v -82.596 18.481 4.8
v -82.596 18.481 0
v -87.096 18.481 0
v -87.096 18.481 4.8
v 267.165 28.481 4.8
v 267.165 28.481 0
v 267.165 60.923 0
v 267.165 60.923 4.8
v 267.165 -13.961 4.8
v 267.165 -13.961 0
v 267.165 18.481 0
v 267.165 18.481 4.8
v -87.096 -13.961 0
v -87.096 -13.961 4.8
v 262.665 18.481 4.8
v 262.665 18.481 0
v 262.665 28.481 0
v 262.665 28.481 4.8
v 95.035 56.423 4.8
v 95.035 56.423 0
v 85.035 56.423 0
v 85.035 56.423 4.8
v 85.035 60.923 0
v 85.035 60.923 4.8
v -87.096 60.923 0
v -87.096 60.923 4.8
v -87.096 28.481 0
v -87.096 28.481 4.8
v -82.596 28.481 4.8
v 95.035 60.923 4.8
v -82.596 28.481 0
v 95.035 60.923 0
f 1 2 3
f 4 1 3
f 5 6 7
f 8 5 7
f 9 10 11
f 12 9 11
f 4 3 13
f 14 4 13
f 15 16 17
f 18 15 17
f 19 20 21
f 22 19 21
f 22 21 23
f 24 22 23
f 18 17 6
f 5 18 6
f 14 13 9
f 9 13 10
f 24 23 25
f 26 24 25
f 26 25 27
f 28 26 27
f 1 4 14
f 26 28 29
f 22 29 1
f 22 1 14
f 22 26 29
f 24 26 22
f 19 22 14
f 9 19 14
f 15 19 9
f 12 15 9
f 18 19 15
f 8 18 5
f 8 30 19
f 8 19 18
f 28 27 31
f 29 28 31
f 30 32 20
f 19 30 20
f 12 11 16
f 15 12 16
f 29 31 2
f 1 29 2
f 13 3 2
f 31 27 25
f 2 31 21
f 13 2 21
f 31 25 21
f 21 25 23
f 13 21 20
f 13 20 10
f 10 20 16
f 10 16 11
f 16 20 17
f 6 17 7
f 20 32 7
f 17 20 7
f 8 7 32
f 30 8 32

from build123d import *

# Parameters (mm, degrees)
F1_DEPTH = 4.8


with BuildPart() as f1:
    # F0 (on Top) → F1 (new body)
    with BuildSketch(Plane.XY):
        Polygon((-82.595532, 18.481104), (-87.095532, 18.481104), (-87.095532, -13.960981), (85.034968, -13.960981), (85.034968, -9.460981), (90.034968, -9.460981), (90.034968, 23.481104), (-82.595532, 23.481104), align=None)
        Polygon((85.034968, 60.923189), (-87.095532, 60.923189), (-87.095532, 28.481104), (-82.595532, 28.481104), (-82.595532, 23.481104), (90.034968, 23.481104), (90.034968, 56.423189), (85.034968, 56.423189), align=None)
        Polygon((262.665468, 23.481104), (90.034968, 23.481104), (90.034968, -9.460981), (95.034968, -9.460981), (95.034968, -13.960981), (267.165468, -13.960981), (267.165468, 18.481104), (262.665468, 18.481104), align=None)
        Polygon((267.165468, 60.923189), (95.034968, 60.923189), (95.034968, 56.423189), (90.034968, 56.423189), (90.034968, 23.481104), (262.665468, 23.481104), (262.665468, 28.481104), (267.165468, 28.481104), align=None)
        Polygon((85.034968, -9.460981), (85.034968, -13.960981), (95.034968, -13.960981), (95.034968, -9.460981), (90.034968, -9.460981), align=None)
    extrude(amount=F1_DEPTH)


solid = f1.part
